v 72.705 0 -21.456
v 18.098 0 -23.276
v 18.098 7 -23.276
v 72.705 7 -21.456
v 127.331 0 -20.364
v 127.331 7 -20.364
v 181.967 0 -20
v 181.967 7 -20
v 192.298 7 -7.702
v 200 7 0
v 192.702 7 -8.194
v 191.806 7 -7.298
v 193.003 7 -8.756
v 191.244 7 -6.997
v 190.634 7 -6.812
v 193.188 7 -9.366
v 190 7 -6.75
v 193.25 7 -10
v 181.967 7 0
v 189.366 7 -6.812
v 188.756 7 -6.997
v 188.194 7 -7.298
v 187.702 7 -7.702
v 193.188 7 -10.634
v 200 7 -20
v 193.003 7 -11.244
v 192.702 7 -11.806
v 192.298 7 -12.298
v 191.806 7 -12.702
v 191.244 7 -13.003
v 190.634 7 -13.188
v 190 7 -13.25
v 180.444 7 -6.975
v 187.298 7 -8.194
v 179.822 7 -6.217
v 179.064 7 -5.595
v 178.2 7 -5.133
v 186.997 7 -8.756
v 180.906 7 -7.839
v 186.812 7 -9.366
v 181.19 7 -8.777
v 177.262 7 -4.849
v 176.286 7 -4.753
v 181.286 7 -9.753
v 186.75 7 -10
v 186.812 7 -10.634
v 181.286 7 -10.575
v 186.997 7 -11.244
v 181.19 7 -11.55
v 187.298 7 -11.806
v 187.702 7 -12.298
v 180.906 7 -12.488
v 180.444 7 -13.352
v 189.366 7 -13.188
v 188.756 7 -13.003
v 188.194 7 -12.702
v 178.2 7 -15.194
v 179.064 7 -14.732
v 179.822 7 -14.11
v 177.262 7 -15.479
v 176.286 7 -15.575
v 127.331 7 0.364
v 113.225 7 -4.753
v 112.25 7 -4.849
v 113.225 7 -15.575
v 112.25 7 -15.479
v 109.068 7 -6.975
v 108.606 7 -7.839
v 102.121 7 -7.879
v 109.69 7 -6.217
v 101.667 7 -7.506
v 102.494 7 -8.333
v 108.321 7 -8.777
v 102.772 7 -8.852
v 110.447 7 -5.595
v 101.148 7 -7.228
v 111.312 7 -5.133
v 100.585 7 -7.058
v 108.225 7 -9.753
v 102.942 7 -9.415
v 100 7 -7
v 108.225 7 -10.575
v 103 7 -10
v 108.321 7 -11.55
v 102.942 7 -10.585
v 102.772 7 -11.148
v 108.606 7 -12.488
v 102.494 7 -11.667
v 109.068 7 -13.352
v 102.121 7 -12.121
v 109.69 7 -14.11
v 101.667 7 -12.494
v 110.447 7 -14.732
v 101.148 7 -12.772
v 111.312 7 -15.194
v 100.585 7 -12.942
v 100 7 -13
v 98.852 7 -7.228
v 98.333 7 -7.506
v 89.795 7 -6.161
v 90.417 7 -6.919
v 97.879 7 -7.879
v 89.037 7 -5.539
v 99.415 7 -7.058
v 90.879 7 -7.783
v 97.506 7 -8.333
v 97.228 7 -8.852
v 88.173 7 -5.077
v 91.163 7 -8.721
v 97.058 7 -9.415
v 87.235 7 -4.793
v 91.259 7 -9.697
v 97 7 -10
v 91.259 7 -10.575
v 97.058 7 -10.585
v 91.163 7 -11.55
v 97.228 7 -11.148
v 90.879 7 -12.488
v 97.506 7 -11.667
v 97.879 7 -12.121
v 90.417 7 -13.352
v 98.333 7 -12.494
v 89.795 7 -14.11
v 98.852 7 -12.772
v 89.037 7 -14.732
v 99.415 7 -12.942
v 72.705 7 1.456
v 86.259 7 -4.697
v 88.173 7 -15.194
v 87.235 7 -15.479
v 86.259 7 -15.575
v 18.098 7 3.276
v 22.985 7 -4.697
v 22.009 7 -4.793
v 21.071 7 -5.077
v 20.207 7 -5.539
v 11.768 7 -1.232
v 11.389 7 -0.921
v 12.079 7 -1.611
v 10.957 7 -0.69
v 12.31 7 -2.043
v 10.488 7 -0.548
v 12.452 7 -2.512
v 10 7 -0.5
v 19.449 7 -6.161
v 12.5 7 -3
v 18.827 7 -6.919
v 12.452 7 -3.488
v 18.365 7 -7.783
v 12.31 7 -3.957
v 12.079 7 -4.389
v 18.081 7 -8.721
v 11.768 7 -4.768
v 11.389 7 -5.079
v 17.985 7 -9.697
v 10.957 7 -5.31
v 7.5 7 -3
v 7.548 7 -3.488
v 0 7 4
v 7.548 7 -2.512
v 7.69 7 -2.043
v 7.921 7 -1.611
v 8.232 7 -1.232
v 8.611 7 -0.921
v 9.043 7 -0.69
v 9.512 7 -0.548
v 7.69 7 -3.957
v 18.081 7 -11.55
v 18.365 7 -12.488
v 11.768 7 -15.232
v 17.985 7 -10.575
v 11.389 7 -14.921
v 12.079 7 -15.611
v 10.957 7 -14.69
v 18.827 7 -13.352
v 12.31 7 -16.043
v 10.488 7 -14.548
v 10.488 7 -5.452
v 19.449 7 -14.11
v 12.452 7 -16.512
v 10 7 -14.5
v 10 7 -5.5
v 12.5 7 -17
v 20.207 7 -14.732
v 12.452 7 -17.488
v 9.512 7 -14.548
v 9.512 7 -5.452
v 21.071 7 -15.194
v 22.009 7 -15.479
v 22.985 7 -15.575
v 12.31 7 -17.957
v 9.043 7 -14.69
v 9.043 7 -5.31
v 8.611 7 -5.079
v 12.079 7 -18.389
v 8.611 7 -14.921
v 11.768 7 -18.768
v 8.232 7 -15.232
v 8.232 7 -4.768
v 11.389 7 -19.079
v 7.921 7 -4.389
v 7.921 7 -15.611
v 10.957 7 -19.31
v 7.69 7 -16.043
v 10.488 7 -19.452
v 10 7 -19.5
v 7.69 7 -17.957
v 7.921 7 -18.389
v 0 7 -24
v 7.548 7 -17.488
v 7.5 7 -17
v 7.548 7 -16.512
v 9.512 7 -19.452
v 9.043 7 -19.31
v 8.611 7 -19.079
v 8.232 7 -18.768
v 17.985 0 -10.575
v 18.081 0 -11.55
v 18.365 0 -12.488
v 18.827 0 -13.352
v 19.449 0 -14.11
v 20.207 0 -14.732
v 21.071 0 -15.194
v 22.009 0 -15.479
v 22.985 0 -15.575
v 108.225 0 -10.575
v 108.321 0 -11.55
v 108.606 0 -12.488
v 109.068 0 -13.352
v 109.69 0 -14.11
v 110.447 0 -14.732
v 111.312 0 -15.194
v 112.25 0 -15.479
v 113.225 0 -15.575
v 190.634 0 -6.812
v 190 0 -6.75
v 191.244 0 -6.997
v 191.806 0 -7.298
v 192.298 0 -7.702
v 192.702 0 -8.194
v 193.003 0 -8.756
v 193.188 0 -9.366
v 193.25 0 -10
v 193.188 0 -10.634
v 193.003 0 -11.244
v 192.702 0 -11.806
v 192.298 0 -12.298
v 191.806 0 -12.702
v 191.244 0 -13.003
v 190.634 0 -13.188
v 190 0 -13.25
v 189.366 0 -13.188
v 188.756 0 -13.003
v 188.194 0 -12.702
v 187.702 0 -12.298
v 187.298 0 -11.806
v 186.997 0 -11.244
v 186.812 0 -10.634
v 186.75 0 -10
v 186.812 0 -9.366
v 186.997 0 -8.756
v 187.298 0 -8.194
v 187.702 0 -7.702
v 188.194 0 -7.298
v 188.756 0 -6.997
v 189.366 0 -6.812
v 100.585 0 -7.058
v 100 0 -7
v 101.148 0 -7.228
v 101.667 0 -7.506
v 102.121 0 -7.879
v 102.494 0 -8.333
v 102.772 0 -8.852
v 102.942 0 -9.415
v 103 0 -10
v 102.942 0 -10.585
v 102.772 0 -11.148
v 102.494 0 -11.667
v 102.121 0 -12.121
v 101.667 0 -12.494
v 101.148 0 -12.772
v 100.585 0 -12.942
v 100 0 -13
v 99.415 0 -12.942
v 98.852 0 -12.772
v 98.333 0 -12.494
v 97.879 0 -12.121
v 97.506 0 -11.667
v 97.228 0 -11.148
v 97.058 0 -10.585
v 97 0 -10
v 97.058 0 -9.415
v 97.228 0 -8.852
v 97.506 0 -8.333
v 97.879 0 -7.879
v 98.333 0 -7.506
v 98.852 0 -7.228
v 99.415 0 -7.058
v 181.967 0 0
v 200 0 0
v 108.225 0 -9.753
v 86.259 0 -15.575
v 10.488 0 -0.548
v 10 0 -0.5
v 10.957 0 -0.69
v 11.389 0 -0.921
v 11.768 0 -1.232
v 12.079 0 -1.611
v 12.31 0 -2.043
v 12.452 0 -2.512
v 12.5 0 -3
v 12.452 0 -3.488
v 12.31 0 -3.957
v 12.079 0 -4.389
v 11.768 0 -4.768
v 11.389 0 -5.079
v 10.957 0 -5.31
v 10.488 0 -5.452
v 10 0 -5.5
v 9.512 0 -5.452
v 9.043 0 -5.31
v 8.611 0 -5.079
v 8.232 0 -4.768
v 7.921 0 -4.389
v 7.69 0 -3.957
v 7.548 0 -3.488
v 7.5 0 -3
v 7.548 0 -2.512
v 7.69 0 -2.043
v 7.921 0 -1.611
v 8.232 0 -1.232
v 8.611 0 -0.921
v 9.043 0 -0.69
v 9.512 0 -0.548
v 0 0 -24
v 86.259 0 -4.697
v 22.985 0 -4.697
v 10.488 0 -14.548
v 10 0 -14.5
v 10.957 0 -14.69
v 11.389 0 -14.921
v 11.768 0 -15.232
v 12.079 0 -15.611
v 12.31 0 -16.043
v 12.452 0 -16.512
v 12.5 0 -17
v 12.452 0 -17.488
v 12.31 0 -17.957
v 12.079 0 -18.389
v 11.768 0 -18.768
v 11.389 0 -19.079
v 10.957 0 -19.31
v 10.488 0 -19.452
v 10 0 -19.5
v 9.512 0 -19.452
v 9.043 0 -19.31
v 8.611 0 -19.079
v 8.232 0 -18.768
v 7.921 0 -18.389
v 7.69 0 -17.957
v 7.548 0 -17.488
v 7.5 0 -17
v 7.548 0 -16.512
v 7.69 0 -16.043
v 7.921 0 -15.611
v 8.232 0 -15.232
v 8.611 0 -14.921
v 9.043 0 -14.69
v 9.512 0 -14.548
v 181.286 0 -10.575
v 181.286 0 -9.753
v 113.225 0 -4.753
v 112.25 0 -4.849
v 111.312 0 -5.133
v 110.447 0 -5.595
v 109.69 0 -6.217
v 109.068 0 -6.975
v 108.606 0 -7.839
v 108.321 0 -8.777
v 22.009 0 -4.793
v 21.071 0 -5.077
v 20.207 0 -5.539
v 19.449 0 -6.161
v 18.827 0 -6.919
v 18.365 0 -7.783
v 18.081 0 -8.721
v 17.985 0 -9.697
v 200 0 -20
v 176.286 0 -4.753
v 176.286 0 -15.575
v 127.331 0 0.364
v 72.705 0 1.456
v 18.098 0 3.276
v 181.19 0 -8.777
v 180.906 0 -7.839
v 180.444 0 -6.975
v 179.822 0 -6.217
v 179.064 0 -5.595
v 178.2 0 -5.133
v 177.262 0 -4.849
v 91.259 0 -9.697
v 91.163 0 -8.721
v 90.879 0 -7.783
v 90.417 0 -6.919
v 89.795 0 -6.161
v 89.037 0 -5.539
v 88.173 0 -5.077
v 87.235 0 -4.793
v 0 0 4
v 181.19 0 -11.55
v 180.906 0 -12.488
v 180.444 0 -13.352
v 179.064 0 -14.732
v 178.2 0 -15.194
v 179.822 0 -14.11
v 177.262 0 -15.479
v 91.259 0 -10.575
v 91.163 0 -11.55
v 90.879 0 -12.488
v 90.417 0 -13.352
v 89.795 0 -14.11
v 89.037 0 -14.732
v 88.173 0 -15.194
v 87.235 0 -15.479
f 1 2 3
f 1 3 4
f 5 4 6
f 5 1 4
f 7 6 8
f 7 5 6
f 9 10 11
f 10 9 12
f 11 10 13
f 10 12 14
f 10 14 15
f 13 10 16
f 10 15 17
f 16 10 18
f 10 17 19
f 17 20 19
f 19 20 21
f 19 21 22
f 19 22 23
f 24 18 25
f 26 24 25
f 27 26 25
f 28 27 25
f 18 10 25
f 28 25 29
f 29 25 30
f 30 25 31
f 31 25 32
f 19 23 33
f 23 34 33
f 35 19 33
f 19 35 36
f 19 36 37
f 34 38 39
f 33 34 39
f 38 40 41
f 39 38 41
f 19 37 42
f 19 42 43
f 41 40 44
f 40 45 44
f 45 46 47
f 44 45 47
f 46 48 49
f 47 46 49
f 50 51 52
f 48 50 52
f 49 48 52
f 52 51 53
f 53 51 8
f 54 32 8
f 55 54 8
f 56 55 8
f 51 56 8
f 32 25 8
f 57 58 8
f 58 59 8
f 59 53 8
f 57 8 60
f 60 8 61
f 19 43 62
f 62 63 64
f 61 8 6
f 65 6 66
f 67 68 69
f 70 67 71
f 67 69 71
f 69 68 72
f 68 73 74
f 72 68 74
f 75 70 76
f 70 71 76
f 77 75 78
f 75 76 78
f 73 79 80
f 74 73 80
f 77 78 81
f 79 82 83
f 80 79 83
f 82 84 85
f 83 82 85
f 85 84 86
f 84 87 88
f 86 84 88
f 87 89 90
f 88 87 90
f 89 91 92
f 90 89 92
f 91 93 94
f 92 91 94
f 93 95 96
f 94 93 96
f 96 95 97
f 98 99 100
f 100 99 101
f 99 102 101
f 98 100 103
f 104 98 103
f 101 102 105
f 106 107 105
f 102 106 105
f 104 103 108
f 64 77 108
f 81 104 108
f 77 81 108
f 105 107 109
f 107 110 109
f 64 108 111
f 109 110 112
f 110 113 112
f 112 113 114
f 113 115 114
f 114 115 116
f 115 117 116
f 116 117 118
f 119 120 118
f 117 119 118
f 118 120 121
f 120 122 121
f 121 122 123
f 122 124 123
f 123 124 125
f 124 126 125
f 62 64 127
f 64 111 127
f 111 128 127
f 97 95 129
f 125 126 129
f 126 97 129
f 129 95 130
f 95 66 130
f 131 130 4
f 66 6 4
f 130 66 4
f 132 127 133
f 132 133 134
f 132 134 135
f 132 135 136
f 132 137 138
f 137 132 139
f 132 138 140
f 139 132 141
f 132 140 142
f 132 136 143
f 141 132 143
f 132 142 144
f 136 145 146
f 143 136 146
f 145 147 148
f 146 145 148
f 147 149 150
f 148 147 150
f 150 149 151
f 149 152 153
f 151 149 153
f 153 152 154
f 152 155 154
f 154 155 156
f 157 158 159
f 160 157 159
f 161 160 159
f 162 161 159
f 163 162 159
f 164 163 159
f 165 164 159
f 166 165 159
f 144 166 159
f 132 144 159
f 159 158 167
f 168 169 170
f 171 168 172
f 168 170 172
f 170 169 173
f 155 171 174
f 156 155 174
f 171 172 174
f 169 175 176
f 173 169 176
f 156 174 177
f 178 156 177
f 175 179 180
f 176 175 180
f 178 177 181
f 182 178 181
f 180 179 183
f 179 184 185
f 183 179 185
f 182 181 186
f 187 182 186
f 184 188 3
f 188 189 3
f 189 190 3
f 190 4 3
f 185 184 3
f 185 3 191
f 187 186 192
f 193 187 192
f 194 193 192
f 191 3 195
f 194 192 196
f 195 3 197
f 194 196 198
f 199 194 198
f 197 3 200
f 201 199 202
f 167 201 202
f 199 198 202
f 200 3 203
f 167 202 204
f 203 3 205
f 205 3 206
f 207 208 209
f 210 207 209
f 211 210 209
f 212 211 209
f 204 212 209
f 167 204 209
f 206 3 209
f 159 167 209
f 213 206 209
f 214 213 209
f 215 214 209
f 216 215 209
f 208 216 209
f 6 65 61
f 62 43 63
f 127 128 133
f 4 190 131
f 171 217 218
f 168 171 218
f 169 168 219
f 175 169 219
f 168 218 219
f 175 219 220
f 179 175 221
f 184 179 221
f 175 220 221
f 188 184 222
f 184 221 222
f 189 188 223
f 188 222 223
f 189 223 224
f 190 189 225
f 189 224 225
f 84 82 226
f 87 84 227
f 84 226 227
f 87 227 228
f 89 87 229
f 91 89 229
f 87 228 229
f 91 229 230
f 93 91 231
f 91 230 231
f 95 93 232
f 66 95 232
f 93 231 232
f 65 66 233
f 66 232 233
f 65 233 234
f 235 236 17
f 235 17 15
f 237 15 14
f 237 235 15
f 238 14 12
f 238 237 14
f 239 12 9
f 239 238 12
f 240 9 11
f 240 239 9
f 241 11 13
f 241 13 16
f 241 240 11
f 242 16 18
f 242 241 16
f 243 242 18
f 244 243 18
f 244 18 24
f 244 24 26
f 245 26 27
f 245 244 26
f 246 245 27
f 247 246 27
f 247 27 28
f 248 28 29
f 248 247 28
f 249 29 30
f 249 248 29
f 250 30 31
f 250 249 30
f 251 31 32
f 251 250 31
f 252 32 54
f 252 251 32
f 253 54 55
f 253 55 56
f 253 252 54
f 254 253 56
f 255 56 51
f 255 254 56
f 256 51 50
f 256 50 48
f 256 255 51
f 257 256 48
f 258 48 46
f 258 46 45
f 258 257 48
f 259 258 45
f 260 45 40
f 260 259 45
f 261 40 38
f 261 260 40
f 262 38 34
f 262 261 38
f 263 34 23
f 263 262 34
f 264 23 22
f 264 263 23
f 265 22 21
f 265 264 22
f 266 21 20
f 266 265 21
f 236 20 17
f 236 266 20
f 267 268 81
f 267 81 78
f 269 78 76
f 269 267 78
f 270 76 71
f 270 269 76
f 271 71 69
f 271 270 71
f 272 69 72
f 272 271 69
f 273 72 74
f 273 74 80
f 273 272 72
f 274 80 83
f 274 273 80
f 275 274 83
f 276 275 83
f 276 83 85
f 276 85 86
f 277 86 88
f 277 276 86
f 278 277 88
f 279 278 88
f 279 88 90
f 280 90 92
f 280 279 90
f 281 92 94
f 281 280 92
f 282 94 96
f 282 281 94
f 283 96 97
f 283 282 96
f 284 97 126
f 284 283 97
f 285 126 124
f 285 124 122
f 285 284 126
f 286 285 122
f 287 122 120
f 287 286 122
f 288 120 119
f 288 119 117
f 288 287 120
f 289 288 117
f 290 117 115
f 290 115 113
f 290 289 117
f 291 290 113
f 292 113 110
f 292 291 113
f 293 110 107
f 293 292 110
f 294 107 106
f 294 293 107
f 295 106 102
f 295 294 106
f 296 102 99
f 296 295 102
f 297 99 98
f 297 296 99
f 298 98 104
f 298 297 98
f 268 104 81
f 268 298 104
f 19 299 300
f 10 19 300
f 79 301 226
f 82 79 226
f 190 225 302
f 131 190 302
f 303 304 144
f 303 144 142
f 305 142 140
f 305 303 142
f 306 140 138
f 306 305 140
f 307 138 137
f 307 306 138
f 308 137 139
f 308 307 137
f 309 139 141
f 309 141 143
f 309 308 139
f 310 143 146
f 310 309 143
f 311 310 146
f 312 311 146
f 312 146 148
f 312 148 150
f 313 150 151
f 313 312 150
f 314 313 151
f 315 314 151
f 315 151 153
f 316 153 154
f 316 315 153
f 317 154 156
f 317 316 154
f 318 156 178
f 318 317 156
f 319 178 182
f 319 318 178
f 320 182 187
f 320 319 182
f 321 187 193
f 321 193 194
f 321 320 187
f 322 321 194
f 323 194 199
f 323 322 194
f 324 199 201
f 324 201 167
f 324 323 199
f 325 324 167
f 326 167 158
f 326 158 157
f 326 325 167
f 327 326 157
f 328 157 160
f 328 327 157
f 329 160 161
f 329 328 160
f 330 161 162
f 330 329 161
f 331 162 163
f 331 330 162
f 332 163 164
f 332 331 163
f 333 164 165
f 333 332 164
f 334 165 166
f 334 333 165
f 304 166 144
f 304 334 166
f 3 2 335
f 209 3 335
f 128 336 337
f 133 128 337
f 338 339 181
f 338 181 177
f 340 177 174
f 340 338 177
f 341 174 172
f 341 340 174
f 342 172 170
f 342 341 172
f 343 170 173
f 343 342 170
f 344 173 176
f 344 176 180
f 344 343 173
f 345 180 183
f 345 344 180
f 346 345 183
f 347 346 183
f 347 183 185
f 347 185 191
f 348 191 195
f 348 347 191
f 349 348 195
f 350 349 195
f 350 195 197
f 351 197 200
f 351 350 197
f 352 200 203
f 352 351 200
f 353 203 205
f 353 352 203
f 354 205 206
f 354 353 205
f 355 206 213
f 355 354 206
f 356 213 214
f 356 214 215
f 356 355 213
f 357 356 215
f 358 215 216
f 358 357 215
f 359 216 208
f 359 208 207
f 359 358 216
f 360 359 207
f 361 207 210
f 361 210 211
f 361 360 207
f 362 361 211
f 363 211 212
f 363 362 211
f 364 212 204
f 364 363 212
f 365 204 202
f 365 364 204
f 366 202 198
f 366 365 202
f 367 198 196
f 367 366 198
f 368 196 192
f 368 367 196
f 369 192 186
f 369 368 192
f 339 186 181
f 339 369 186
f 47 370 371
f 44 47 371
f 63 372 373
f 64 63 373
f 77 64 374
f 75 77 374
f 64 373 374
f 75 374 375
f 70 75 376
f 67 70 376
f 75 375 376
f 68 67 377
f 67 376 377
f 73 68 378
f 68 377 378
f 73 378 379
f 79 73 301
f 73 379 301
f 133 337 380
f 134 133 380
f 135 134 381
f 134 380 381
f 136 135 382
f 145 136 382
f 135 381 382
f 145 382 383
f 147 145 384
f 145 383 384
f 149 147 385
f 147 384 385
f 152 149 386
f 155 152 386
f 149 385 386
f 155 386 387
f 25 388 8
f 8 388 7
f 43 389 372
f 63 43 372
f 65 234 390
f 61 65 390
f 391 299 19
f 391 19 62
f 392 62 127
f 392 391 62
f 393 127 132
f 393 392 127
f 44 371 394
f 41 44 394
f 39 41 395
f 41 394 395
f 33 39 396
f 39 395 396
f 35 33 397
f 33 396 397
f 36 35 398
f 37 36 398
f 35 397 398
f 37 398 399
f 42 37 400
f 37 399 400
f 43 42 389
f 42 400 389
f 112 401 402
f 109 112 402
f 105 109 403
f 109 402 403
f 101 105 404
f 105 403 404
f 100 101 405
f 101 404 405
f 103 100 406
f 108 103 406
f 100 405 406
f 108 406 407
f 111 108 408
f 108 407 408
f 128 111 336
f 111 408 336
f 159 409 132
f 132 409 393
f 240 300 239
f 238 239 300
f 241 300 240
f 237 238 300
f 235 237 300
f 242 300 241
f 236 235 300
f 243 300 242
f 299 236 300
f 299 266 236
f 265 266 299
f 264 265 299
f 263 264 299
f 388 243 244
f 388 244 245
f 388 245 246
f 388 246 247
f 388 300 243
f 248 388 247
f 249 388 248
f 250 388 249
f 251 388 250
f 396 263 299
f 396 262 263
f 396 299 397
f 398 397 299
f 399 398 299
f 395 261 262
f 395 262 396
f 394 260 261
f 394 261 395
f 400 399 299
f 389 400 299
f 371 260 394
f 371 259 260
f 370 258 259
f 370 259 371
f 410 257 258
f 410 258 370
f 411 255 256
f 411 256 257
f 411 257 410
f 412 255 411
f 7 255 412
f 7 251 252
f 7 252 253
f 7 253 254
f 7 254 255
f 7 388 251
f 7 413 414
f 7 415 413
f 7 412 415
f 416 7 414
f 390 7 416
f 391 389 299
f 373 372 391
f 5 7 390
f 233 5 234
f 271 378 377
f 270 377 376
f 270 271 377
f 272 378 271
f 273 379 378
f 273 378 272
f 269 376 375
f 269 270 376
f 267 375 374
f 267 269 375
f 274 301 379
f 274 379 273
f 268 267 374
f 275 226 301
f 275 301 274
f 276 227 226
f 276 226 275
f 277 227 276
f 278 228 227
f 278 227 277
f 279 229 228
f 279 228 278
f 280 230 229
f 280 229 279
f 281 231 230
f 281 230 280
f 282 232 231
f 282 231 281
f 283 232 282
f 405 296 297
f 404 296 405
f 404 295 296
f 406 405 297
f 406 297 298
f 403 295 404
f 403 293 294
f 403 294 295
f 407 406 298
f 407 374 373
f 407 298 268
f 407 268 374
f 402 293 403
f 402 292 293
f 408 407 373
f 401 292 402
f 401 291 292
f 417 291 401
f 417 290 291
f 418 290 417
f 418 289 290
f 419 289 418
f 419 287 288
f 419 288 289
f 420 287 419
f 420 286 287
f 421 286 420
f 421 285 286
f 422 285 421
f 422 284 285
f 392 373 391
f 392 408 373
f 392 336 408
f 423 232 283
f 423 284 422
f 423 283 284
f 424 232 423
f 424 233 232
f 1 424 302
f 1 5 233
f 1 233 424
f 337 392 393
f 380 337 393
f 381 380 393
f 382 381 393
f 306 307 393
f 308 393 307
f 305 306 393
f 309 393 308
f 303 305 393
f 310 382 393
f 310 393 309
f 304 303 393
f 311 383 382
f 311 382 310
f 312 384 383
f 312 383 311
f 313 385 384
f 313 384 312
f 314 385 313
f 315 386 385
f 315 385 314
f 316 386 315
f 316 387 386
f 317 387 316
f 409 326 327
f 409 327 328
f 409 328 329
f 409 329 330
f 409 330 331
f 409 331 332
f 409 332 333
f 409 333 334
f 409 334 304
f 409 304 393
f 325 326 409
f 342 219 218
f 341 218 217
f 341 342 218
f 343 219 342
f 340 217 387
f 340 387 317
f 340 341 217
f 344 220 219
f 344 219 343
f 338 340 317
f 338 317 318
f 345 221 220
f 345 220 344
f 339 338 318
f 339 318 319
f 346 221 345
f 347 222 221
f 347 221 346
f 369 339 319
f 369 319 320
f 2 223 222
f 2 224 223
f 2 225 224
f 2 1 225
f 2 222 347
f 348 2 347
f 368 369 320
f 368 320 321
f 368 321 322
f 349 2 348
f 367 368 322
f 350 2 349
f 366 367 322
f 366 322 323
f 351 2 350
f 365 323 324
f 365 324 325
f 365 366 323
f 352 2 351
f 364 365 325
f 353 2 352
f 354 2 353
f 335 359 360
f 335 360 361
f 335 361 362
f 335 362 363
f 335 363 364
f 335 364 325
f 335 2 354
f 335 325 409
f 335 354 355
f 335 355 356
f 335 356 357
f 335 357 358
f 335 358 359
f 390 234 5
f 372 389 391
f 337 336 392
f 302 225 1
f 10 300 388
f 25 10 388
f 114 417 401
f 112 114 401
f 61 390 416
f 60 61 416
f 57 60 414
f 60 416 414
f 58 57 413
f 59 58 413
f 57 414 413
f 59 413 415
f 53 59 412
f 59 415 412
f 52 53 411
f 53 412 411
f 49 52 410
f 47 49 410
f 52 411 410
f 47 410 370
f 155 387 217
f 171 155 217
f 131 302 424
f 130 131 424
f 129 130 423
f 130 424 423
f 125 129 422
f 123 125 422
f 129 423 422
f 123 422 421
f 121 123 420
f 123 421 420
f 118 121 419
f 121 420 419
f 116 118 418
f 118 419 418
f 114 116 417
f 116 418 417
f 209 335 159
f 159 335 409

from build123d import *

# Parameters (mm, degrees)
SZKIC1_R                    = 3
SZKIC1_R_2                  = 3.25
SZKIC1_R_3                  = 2.5
DODANIE_WYCI_GNI_CIE1_DEPTH = 7
ZAOKR_GLENIE1_R             = 4100


with BuildPart() as part:
    # Szkic1 → Dodanie-wyciągnięcie1 (new body)
    with BuildSketch(Plane(origin=(0, 0, 0), x_dir=(1, 0, 0), z_dir=(0, 1, 0))):
        Polygon((200, 0), (200, 20), (100, 20), (0, 24), (0, -4), (100, 0), align=None)
        with Locations(Location((100, 10, 0), (0, 0, 270))):
            Circle(SZKIC1_R, mode=Mode.SUBTRACT)
        with Locations(Location((190, 10, 0), (0, 0, 270))):
            Circle(SZKIC1_R_2, mode=Mode.SUBTRACT)
        with Locations(Location((10, 17, 0), (0, 0, 270))):
            Circle(SZKIC1_R_3, mode=Mode.SUBTRACT)
        with Locations(Location((10, 3, 0), (0, 0, 270))):
            Circle(SZKIC1_R_3, mode=Mode.SUBTRACT)
        with BuildLine():
            Line((22.984822323, 15.57457628), (86.25939238, 15.57457628))
            ThreePointArc((86.25939238, 15.57457628), (89.794926286, 14.110110186), (91.25939238, 10.57457628))
            Line((91.25939238, 10.57457628), (91.25939238, 9.696719379))
            ThreePointArc((91.25939238, 9.696719379), (89.794926286, 6.161185473), (86.25939238, 4.696719379))
            Line((86.25939238, 4.696719379), (22.984822323, 4.696719379))
            ThreePointArc((22.984822323, 4.696719379), (19.449288417, 6.161185473), (17.984822323, 9.696719379))
            Line((17.984822323, 9.696719379), (17.984822323, 10.57457628))
            ThreePointArc((17.984822323, 10.57457628), (19.449288417, 14.110110186), (22.984822323, 15.57457628))
        make_face(mode=Mode.SUBTRACT)
        with BuildLine():
            Line((113.225148066, 15.57457628), (176.286209663, 15.57457628))
            ThreePointArc((176.286209663, 15.57457628), (179.821743569, 14.110110186), (181.286209663, 10.57457628))
            Line((181.286209663, 10.57457628), (181.286209663, 9.752776346))
            ThreePointArc((181.286209663, 9.752776346), (179.821743569, 6.21724244), (176.286209663, 4.752776346))
            Line((176.286209663, 4.752776346), (113.225148066, 4.752776346))
            ThreePointArc((113.225148066, 4.752776346), (109.68961416, 6.21724244), (108.225148066, 9.752776346))
            Line((108.225148066, 9.752776346), (108.225148066, 10.57457628))
            ThreePointArc((108.225148066, 10.57457628), (109.68961416, 14.110110186), (113.225148066, 15.57457628))
        make_face(mode=Mode.SUBTRACT)
    extrude(amount=DODANIE_WYCI_GNI_CIE1_DEPTH)

    # Zaokrąglenie1
    # the kernel refuses this fillet: 4100 mm, written as the material it adds along each edge
    with BuildSketch(Plane(origin=(100, 0, -20), x_dir=(1, 0, 0), z_dir=(0, 1, 0)), Plane(origin=(100, 0, 0), x_dir=(-0.9992009587217893, 0, 0.03996803834887583), z_dir=(0, 1, 0))) as zaokr_glenie1_piece_1:
        with BuildLine():
            CenterArc((ZAOKR_GLENIE1_R * 0.0199920063936, ZAOKR_GLENIE1_R), ZAOKR_GLENIE1_R, 267.709389957, 2.290610043)
            Line((-ZAOKR_GLENIE1_R * 0.0199760319553, ZAOKR_GLENIE1_R * 0.000799041278211), (0, 0))
            Line((0, 0), (ZAOKR_GLENIE1_R * 0.0199920063936, 0))
        make_face()
    extrude(amount=7)


solid = part.part
